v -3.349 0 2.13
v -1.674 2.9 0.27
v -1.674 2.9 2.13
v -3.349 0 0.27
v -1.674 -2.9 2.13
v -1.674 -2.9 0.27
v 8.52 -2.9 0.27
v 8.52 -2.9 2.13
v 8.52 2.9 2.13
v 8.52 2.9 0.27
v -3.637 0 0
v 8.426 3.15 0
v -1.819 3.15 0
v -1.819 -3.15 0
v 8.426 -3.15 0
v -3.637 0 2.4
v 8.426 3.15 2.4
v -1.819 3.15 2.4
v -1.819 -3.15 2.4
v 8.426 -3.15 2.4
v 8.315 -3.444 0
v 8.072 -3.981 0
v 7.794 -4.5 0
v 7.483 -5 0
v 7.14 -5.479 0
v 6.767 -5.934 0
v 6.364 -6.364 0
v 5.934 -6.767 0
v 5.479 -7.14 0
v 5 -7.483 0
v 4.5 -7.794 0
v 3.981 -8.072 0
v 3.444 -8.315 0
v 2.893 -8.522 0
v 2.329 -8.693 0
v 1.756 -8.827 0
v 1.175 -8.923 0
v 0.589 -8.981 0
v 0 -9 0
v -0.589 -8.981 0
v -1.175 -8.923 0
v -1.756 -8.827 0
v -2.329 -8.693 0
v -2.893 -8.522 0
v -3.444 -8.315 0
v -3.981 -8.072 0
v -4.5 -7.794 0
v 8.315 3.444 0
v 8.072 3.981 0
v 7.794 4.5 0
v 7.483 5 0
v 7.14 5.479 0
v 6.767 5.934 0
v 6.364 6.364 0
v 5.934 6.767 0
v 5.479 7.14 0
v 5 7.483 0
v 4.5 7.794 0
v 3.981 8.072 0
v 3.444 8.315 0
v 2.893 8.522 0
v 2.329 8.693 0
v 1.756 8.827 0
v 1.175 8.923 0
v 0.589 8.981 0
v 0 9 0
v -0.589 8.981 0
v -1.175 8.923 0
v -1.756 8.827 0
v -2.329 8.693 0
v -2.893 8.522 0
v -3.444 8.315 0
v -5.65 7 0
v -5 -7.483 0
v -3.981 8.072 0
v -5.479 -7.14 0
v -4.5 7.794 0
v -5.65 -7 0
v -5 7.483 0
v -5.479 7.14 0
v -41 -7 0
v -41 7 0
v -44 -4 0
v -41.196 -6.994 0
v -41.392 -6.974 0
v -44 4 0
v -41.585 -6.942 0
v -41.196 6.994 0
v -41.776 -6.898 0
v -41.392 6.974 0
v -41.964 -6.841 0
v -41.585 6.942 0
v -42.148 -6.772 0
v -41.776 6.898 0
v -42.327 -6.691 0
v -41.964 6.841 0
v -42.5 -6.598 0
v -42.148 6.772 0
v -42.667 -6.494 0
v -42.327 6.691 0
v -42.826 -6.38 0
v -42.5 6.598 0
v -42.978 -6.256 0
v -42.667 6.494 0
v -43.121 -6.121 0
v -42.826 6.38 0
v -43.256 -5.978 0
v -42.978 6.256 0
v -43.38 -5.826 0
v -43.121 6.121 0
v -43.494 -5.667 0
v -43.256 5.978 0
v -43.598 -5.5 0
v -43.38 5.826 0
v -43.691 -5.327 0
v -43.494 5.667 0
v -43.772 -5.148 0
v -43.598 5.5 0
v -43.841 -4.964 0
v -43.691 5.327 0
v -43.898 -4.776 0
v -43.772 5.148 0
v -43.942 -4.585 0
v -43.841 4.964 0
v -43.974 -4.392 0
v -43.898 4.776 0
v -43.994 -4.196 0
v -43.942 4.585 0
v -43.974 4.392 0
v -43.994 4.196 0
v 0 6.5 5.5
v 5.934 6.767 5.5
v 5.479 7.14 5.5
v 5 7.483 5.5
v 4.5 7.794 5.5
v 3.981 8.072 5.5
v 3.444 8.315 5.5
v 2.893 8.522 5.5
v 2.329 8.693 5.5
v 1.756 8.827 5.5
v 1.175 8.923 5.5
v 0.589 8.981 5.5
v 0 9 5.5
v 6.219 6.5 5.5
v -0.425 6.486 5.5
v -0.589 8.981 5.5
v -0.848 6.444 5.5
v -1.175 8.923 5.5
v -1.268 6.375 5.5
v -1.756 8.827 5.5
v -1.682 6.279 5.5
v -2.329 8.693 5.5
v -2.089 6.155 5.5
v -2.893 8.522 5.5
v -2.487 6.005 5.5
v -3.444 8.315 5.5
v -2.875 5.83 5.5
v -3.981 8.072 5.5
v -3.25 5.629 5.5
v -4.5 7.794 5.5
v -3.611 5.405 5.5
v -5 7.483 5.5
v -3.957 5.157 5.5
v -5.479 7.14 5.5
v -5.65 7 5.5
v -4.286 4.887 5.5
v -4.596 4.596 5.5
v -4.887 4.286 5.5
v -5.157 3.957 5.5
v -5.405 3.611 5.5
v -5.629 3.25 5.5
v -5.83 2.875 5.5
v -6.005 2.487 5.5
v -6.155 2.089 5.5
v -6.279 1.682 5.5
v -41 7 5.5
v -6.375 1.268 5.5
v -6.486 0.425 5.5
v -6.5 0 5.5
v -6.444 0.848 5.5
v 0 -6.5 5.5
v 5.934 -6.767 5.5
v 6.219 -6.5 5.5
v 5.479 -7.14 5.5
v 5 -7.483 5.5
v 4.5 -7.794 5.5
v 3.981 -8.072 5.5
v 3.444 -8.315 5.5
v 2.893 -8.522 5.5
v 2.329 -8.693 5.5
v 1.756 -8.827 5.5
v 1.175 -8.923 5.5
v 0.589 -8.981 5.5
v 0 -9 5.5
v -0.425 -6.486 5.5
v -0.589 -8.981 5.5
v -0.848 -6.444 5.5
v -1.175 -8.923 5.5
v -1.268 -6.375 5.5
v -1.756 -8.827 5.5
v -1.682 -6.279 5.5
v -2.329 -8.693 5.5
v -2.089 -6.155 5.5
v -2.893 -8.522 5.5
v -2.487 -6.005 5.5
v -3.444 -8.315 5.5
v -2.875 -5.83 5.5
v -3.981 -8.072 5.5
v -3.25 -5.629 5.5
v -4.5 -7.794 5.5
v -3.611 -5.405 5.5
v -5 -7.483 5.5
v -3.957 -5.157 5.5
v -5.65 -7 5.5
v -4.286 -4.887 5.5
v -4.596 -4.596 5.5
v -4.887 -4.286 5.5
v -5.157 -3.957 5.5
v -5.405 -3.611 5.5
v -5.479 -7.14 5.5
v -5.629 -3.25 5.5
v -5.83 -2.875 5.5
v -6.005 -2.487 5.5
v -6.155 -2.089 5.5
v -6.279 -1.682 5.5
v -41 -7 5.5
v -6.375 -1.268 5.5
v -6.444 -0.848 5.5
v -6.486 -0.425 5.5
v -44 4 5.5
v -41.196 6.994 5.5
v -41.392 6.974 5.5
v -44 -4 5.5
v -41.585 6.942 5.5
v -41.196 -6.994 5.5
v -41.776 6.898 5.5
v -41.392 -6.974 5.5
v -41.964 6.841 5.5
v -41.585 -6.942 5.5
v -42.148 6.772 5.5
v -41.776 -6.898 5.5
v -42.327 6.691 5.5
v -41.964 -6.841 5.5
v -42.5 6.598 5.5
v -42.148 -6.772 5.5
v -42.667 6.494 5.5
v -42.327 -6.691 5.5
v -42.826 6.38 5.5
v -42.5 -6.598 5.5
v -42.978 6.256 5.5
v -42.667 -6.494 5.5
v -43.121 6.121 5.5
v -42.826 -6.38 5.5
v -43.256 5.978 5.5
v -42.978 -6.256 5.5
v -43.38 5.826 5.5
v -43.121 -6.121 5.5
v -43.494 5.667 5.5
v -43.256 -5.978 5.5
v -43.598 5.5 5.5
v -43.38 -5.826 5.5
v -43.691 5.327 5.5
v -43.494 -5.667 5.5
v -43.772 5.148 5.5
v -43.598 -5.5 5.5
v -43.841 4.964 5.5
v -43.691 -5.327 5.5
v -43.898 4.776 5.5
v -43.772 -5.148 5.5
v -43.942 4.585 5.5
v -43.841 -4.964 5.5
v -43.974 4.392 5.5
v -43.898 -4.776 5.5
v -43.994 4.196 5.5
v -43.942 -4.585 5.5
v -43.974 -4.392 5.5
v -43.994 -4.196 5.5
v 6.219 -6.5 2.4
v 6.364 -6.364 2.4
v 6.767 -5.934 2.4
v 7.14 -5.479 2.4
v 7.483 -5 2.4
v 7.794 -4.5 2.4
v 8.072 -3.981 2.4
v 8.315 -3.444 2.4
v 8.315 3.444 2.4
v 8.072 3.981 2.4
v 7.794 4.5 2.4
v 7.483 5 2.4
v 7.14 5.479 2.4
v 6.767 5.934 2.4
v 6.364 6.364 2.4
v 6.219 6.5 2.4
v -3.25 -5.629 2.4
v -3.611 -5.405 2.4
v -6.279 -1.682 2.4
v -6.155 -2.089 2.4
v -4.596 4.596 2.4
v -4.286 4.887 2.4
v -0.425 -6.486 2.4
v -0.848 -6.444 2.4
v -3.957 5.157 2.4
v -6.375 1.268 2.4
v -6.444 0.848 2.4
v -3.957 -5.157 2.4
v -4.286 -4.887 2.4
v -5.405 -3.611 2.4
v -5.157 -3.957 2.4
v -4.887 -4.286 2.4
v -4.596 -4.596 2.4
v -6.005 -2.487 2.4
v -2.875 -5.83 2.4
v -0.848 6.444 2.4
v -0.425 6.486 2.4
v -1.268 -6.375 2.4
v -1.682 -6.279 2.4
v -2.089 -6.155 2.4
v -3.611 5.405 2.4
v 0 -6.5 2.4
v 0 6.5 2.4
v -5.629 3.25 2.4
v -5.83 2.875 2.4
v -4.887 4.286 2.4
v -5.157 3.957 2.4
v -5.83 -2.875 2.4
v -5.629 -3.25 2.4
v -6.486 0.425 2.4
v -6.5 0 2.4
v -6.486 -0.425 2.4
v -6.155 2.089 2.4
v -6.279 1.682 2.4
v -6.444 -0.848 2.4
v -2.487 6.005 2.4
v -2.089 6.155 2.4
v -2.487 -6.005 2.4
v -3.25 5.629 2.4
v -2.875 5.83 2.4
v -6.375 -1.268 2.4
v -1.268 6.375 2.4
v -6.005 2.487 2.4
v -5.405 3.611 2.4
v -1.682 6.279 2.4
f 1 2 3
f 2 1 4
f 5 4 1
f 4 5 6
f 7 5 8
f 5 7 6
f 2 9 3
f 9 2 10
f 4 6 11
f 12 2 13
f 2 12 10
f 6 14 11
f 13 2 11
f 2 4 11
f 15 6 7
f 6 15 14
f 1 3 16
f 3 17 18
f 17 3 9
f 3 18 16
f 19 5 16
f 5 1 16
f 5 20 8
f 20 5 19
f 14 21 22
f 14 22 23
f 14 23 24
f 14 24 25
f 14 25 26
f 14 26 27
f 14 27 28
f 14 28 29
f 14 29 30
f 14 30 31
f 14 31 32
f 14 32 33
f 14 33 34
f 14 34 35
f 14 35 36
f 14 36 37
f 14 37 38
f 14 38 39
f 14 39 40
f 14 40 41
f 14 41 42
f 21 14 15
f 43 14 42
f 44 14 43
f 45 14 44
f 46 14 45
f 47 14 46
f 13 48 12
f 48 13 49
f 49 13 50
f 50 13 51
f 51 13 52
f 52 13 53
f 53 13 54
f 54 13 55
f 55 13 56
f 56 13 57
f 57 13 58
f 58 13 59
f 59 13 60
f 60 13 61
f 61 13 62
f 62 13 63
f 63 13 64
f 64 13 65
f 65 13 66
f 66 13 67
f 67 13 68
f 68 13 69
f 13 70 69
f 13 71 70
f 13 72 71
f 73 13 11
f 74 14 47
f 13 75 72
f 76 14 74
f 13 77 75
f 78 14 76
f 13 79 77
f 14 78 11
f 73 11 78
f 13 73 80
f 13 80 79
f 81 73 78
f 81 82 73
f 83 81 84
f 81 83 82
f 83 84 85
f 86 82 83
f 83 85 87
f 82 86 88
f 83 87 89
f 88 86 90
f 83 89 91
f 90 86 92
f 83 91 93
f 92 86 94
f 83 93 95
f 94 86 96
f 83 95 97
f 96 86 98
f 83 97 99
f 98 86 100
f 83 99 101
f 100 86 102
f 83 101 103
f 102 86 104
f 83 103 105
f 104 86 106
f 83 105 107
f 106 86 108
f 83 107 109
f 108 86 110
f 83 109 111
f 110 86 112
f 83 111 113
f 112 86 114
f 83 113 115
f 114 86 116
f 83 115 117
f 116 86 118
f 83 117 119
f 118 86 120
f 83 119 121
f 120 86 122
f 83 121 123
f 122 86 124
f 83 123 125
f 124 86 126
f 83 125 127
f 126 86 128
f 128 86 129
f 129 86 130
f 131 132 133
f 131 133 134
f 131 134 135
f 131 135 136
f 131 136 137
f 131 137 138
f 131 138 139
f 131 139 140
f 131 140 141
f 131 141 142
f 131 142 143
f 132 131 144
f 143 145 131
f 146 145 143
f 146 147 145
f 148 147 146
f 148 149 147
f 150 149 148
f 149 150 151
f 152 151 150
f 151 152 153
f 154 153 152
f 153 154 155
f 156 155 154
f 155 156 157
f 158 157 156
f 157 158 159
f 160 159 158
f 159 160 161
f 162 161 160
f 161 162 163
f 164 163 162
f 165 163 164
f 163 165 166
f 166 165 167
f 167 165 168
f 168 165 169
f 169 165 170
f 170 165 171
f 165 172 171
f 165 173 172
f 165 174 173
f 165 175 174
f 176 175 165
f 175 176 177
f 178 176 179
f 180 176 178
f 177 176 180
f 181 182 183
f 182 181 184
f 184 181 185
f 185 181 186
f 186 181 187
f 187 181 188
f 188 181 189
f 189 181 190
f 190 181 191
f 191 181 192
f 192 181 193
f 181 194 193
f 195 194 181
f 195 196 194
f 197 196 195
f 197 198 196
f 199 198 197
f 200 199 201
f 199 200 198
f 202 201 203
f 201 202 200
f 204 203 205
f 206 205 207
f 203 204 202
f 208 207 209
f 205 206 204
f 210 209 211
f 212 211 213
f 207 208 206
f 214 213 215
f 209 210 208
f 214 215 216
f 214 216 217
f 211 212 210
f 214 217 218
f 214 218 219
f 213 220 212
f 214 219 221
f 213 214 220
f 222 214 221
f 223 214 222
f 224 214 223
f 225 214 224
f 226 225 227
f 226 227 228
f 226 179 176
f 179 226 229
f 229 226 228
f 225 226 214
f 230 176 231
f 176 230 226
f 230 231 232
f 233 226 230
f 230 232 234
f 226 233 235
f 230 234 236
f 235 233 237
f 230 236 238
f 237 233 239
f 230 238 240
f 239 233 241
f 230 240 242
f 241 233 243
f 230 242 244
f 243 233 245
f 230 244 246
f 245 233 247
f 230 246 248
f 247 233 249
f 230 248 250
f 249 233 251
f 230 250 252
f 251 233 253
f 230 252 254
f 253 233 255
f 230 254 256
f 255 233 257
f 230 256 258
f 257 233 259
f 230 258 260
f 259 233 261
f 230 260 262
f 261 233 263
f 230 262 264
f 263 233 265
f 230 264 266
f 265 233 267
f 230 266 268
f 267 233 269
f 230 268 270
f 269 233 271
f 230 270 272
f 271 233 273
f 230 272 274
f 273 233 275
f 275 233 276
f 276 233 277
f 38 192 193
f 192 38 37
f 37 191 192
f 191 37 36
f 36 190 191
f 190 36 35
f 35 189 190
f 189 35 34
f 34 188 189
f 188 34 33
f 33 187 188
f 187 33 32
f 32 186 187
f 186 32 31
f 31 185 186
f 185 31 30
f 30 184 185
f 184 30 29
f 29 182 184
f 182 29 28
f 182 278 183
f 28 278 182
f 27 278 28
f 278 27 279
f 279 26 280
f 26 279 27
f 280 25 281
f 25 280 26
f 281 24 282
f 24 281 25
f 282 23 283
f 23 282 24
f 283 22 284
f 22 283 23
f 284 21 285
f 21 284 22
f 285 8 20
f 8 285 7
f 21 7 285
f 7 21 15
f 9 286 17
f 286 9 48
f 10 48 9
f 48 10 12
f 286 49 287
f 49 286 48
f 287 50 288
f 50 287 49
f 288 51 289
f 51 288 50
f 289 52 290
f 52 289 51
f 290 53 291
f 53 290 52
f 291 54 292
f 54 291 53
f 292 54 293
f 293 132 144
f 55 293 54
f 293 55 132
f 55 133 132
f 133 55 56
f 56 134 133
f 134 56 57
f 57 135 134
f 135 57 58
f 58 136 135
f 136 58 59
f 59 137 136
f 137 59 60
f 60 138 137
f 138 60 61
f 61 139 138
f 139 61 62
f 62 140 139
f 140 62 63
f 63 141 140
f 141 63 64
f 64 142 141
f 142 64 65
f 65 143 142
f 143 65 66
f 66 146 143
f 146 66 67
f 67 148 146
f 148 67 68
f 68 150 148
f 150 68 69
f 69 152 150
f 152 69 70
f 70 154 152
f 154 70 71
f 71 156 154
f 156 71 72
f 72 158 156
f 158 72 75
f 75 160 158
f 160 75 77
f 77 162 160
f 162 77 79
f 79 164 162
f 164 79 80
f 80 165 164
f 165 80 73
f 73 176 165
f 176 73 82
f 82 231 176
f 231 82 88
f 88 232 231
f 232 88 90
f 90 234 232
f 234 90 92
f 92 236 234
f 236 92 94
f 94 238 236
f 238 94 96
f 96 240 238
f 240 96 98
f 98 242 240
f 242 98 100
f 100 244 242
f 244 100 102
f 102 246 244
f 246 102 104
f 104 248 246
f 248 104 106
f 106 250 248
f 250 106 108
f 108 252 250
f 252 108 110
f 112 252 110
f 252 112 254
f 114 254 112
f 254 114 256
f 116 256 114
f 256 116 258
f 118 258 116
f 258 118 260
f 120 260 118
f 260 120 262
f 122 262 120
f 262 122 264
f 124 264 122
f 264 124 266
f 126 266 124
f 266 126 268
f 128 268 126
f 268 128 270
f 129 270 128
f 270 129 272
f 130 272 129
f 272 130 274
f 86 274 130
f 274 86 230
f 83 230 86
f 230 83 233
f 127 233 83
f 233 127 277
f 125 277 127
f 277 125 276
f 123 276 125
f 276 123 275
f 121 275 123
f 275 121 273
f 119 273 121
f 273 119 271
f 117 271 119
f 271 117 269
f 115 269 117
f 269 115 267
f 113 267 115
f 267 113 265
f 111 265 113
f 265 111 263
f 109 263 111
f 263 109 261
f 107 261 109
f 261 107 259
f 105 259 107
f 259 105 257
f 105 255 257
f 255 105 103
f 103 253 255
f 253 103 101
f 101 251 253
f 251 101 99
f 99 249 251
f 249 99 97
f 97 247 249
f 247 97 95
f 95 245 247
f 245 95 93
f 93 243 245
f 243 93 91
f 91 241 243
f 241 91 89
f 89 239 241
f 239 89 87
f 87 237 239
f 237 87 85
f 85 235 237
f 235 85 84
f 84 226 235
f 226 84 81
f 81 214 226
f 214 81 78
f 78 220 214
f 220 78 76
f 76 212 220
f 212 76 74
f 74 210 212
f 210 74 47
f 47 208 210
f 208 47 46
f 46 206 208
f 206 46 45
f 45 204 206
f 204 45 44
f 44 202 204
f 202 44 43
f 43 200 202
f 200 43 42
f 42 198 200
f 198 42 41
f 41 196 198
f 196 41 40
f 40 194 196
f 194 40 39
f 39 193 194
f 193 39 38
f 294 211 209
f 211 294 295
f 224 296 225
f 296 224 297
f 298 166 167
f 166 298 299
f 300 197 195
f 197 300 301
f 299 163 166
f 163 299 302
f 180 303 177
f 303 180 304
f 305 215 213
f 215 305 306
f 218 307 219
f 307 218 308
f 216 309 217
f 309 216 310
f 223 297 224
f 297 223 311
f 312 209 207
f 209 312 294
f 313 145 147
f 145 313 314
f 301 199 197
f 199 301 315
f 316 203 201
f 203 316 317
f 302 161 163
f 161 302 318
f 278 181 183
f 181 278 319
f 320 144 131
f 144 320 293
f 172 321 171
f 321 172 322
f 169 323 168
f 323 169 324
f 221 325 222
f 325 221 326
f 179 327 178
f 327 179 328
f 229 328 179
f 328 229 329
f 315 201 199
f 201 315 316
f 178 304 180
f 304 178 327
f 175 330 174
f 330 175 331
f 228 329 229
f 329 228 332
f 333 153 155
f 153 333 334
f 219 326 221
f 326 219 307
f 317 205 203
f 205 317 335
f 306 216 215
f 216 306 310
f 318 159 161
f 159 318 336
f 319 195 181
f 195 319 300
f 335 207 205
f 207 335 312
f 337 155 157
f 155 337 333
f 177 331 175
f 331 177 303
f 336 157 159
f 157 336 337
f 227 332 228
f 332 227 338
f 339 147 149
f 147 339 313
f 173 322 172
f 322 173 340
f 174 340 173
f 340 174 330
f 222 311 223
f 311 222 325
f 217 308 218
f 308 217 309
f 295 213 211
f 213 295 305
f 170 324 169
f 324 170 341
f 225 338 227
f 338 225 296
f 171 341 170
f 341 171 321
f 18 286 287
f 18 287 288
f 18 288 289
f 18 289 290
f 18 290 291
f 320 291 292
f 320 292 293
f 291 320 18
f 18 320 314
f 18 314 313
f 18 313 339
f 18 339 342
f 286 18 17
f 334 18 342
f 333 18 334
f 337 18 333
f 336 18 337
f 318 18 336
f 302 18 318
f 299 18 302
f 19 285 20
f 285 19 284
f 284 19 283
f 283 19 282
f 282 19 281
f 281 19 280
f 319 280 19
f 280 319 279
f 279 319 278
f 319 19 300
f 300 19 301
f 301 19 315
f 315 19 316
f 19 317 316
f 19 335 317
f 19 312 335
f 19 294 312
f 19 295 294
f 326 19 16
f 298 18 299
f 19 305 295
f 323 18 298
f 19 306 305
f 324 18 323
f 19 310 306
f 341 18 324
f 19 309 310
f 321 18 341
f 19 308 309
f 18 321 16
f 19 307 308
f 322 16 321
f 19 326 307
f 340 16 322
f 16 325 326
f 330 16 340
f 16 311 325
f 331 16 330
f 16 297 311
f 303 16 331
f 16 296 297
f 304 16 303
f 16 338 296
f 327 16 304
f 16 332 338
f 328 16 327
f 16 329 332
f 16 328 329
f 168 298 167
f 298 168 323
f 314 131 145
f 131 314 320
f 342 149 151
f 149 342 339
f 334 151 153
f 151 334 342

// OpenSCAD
// Nominal examples only. Measure one spare fitting before choosing dimensions.
// Jaw plane: XY. Clevis/pushrod axis: Z. Opening: +X. Hold fitting still and move tool toward -X to remove.
part = "grip"; // grip, contact_coupon, layout
flat_spacing = 5.5; // fitting across flats, not thread diameter
flat_clearance = 0.15; // allowance per flat
contact_depth = 2.4; // must fit entirely inside the usable gripping length
entry_chamfer = 0.25;
arm_clearance_radius = 6.5; // measured arm/pin/keeper envelope plus allowance
head_radius = 9;
handle_length = 44; // axis to far end
handle_width = 14;
handle_thickness = 5.5;
handle_corner_radius = 3;
minimum_wall = 1.8;
coupon_back = 12; // crop behind the axis; jaw and relief stay identical
layout_gap = 8;
$fn = 96;
cut_epsilon = 0.02;

jaw_spacing = flat_spacing + 2*flat_clearance;
hex_radius = jaw_spacing/sqrt(3);

assert(part == "grip" || part == "contact_coupon" || part == "layout", "Unknown part");
assert(flat_spacing > 0 && flat_clearance > 0 && flat_clearance <= flat_spacing/10,
       "Flat size and clearance must be positive with limited play");
assert(contact_depth >= 1.2 && handle_thickness >= contact_depth,
       "Contact depth and handle thickness must preserve printable material");
assert(entry_chamfer > 0 && 2*entry_chamfer < contact_depth,
       "Chamfer must leave a straight contact band");
assert(minimum_wall >= 1.2 && head_radius - hex_radius - entry_chamfer >= minimum_wall,
       "Jaw must retain a continuous back and side wall");
assert(arm_clearance_radius > hex_radius + entry_chamfer &&
       head_radius - arm_clearance_radius >= minimum_wall,
       "Arm relief must clear the jaw and retain an outer wall");
assert(handle_width >= 2*minimum_wall && handle_width <= 2*head_radius &&
       handle_corner_radius > 0 && 2*handle_corner_radius < handle_width,
       "Handle must retain width and rounded ends");
assert(handle_length > head_radius + handle_width &&
       handle_length - arm_clearance_radius > 2*handle_corner_radius,
       "Handle must extend beyond the relief with a broad join");
assert(coupon_back >= head_radius && coupon_back < handle_length-handle_corner_radius,
       "Coupon must preserve the entire jaw and a rear bridge");
assert(layout_gap > 0 && cut_epsilon > 0 && cut_epsilon < entry_chamfer/2 && $fn >= 48,
       "Layout, resolution and cutting overlap must be valid");

module outer_profile() {
    union() {
        circle(r=head_radius);
        hull() for (x=[-handle_length+handle_corner_radius,-head_radius/2])
            for (y=[-handle_width/2+handle_corner_radius,handle_width/2-handle_corner_radius])
                translate([x,y]) circle(r=handle_corner_radius);
    }
}

module jaw_profile(extra=0) {
    offset(delta=extra) union() {
        polygon([for (a=[0:60:300]) [hex_radius*cos(a),hex_radius*sin(a)]]);
        translate([0,-jaw_spacing/2]) square([head_radius+cut_epsilon,jaw_spacing]);
    }
}

module relief_profile() {
    union() {
        circle(r=arm_clearance_radius);
        translate([0,-arm_clearance_radius])
            square([head_radius+cut_epsilon,2*arm_clearance_radius]);
    }
}

module jaw_void() {
    translate([0,0,-cut_epsilon]) linear_extrude(height=contact_depth+2*cut_epsilon)
        jaw_profile();
    hull() {
        translate([0,0,-cut_epsilon]) linear_extrude(height=cut_epsilon) jaw_profile(entry_chamfer);
        translate([0,0,entry_chamfer]) linear_extrude(height=cut_epsilon) jaw_profile();
    }
    hull() {
        translate([0,0,contact_depth-entry_chamfer-cut_epsilon]) linear_extrude(height=cut_epsilon) jaw_profile();
        translate([0,0,contact_depth]) linear_extrude(height=cut_epsilon) jaw_profile(entry_chamfer);
    }
}

module grip() {
    difference() {
        linear_extrude(height=handle_thickness) outer_profile();
        jaw_void();
        translate([0,0,contact_depth])
            linear_extrude(height=handle_thickness-contact_depth+cut_epsilon) relief_profile();
    }
}

module contact_coupon() {
    intersection() {
        grip();
        translate([-coupon_back,-head_radius-cut_epsilon,-cut_epsilon])
            cube([coupon_back+head_radius+cut_epsilon,2*(head_radius+cut_epsilon),
                  handle_thickness+2*cut_epsilon]);
    }
}

if (part == "grip") grip();
else if (part == "contact_coupon") contact_coupon();
else {
    grip();
    translate([0,2*head_radius+layout_gap,0]) contact_coupon();
}
